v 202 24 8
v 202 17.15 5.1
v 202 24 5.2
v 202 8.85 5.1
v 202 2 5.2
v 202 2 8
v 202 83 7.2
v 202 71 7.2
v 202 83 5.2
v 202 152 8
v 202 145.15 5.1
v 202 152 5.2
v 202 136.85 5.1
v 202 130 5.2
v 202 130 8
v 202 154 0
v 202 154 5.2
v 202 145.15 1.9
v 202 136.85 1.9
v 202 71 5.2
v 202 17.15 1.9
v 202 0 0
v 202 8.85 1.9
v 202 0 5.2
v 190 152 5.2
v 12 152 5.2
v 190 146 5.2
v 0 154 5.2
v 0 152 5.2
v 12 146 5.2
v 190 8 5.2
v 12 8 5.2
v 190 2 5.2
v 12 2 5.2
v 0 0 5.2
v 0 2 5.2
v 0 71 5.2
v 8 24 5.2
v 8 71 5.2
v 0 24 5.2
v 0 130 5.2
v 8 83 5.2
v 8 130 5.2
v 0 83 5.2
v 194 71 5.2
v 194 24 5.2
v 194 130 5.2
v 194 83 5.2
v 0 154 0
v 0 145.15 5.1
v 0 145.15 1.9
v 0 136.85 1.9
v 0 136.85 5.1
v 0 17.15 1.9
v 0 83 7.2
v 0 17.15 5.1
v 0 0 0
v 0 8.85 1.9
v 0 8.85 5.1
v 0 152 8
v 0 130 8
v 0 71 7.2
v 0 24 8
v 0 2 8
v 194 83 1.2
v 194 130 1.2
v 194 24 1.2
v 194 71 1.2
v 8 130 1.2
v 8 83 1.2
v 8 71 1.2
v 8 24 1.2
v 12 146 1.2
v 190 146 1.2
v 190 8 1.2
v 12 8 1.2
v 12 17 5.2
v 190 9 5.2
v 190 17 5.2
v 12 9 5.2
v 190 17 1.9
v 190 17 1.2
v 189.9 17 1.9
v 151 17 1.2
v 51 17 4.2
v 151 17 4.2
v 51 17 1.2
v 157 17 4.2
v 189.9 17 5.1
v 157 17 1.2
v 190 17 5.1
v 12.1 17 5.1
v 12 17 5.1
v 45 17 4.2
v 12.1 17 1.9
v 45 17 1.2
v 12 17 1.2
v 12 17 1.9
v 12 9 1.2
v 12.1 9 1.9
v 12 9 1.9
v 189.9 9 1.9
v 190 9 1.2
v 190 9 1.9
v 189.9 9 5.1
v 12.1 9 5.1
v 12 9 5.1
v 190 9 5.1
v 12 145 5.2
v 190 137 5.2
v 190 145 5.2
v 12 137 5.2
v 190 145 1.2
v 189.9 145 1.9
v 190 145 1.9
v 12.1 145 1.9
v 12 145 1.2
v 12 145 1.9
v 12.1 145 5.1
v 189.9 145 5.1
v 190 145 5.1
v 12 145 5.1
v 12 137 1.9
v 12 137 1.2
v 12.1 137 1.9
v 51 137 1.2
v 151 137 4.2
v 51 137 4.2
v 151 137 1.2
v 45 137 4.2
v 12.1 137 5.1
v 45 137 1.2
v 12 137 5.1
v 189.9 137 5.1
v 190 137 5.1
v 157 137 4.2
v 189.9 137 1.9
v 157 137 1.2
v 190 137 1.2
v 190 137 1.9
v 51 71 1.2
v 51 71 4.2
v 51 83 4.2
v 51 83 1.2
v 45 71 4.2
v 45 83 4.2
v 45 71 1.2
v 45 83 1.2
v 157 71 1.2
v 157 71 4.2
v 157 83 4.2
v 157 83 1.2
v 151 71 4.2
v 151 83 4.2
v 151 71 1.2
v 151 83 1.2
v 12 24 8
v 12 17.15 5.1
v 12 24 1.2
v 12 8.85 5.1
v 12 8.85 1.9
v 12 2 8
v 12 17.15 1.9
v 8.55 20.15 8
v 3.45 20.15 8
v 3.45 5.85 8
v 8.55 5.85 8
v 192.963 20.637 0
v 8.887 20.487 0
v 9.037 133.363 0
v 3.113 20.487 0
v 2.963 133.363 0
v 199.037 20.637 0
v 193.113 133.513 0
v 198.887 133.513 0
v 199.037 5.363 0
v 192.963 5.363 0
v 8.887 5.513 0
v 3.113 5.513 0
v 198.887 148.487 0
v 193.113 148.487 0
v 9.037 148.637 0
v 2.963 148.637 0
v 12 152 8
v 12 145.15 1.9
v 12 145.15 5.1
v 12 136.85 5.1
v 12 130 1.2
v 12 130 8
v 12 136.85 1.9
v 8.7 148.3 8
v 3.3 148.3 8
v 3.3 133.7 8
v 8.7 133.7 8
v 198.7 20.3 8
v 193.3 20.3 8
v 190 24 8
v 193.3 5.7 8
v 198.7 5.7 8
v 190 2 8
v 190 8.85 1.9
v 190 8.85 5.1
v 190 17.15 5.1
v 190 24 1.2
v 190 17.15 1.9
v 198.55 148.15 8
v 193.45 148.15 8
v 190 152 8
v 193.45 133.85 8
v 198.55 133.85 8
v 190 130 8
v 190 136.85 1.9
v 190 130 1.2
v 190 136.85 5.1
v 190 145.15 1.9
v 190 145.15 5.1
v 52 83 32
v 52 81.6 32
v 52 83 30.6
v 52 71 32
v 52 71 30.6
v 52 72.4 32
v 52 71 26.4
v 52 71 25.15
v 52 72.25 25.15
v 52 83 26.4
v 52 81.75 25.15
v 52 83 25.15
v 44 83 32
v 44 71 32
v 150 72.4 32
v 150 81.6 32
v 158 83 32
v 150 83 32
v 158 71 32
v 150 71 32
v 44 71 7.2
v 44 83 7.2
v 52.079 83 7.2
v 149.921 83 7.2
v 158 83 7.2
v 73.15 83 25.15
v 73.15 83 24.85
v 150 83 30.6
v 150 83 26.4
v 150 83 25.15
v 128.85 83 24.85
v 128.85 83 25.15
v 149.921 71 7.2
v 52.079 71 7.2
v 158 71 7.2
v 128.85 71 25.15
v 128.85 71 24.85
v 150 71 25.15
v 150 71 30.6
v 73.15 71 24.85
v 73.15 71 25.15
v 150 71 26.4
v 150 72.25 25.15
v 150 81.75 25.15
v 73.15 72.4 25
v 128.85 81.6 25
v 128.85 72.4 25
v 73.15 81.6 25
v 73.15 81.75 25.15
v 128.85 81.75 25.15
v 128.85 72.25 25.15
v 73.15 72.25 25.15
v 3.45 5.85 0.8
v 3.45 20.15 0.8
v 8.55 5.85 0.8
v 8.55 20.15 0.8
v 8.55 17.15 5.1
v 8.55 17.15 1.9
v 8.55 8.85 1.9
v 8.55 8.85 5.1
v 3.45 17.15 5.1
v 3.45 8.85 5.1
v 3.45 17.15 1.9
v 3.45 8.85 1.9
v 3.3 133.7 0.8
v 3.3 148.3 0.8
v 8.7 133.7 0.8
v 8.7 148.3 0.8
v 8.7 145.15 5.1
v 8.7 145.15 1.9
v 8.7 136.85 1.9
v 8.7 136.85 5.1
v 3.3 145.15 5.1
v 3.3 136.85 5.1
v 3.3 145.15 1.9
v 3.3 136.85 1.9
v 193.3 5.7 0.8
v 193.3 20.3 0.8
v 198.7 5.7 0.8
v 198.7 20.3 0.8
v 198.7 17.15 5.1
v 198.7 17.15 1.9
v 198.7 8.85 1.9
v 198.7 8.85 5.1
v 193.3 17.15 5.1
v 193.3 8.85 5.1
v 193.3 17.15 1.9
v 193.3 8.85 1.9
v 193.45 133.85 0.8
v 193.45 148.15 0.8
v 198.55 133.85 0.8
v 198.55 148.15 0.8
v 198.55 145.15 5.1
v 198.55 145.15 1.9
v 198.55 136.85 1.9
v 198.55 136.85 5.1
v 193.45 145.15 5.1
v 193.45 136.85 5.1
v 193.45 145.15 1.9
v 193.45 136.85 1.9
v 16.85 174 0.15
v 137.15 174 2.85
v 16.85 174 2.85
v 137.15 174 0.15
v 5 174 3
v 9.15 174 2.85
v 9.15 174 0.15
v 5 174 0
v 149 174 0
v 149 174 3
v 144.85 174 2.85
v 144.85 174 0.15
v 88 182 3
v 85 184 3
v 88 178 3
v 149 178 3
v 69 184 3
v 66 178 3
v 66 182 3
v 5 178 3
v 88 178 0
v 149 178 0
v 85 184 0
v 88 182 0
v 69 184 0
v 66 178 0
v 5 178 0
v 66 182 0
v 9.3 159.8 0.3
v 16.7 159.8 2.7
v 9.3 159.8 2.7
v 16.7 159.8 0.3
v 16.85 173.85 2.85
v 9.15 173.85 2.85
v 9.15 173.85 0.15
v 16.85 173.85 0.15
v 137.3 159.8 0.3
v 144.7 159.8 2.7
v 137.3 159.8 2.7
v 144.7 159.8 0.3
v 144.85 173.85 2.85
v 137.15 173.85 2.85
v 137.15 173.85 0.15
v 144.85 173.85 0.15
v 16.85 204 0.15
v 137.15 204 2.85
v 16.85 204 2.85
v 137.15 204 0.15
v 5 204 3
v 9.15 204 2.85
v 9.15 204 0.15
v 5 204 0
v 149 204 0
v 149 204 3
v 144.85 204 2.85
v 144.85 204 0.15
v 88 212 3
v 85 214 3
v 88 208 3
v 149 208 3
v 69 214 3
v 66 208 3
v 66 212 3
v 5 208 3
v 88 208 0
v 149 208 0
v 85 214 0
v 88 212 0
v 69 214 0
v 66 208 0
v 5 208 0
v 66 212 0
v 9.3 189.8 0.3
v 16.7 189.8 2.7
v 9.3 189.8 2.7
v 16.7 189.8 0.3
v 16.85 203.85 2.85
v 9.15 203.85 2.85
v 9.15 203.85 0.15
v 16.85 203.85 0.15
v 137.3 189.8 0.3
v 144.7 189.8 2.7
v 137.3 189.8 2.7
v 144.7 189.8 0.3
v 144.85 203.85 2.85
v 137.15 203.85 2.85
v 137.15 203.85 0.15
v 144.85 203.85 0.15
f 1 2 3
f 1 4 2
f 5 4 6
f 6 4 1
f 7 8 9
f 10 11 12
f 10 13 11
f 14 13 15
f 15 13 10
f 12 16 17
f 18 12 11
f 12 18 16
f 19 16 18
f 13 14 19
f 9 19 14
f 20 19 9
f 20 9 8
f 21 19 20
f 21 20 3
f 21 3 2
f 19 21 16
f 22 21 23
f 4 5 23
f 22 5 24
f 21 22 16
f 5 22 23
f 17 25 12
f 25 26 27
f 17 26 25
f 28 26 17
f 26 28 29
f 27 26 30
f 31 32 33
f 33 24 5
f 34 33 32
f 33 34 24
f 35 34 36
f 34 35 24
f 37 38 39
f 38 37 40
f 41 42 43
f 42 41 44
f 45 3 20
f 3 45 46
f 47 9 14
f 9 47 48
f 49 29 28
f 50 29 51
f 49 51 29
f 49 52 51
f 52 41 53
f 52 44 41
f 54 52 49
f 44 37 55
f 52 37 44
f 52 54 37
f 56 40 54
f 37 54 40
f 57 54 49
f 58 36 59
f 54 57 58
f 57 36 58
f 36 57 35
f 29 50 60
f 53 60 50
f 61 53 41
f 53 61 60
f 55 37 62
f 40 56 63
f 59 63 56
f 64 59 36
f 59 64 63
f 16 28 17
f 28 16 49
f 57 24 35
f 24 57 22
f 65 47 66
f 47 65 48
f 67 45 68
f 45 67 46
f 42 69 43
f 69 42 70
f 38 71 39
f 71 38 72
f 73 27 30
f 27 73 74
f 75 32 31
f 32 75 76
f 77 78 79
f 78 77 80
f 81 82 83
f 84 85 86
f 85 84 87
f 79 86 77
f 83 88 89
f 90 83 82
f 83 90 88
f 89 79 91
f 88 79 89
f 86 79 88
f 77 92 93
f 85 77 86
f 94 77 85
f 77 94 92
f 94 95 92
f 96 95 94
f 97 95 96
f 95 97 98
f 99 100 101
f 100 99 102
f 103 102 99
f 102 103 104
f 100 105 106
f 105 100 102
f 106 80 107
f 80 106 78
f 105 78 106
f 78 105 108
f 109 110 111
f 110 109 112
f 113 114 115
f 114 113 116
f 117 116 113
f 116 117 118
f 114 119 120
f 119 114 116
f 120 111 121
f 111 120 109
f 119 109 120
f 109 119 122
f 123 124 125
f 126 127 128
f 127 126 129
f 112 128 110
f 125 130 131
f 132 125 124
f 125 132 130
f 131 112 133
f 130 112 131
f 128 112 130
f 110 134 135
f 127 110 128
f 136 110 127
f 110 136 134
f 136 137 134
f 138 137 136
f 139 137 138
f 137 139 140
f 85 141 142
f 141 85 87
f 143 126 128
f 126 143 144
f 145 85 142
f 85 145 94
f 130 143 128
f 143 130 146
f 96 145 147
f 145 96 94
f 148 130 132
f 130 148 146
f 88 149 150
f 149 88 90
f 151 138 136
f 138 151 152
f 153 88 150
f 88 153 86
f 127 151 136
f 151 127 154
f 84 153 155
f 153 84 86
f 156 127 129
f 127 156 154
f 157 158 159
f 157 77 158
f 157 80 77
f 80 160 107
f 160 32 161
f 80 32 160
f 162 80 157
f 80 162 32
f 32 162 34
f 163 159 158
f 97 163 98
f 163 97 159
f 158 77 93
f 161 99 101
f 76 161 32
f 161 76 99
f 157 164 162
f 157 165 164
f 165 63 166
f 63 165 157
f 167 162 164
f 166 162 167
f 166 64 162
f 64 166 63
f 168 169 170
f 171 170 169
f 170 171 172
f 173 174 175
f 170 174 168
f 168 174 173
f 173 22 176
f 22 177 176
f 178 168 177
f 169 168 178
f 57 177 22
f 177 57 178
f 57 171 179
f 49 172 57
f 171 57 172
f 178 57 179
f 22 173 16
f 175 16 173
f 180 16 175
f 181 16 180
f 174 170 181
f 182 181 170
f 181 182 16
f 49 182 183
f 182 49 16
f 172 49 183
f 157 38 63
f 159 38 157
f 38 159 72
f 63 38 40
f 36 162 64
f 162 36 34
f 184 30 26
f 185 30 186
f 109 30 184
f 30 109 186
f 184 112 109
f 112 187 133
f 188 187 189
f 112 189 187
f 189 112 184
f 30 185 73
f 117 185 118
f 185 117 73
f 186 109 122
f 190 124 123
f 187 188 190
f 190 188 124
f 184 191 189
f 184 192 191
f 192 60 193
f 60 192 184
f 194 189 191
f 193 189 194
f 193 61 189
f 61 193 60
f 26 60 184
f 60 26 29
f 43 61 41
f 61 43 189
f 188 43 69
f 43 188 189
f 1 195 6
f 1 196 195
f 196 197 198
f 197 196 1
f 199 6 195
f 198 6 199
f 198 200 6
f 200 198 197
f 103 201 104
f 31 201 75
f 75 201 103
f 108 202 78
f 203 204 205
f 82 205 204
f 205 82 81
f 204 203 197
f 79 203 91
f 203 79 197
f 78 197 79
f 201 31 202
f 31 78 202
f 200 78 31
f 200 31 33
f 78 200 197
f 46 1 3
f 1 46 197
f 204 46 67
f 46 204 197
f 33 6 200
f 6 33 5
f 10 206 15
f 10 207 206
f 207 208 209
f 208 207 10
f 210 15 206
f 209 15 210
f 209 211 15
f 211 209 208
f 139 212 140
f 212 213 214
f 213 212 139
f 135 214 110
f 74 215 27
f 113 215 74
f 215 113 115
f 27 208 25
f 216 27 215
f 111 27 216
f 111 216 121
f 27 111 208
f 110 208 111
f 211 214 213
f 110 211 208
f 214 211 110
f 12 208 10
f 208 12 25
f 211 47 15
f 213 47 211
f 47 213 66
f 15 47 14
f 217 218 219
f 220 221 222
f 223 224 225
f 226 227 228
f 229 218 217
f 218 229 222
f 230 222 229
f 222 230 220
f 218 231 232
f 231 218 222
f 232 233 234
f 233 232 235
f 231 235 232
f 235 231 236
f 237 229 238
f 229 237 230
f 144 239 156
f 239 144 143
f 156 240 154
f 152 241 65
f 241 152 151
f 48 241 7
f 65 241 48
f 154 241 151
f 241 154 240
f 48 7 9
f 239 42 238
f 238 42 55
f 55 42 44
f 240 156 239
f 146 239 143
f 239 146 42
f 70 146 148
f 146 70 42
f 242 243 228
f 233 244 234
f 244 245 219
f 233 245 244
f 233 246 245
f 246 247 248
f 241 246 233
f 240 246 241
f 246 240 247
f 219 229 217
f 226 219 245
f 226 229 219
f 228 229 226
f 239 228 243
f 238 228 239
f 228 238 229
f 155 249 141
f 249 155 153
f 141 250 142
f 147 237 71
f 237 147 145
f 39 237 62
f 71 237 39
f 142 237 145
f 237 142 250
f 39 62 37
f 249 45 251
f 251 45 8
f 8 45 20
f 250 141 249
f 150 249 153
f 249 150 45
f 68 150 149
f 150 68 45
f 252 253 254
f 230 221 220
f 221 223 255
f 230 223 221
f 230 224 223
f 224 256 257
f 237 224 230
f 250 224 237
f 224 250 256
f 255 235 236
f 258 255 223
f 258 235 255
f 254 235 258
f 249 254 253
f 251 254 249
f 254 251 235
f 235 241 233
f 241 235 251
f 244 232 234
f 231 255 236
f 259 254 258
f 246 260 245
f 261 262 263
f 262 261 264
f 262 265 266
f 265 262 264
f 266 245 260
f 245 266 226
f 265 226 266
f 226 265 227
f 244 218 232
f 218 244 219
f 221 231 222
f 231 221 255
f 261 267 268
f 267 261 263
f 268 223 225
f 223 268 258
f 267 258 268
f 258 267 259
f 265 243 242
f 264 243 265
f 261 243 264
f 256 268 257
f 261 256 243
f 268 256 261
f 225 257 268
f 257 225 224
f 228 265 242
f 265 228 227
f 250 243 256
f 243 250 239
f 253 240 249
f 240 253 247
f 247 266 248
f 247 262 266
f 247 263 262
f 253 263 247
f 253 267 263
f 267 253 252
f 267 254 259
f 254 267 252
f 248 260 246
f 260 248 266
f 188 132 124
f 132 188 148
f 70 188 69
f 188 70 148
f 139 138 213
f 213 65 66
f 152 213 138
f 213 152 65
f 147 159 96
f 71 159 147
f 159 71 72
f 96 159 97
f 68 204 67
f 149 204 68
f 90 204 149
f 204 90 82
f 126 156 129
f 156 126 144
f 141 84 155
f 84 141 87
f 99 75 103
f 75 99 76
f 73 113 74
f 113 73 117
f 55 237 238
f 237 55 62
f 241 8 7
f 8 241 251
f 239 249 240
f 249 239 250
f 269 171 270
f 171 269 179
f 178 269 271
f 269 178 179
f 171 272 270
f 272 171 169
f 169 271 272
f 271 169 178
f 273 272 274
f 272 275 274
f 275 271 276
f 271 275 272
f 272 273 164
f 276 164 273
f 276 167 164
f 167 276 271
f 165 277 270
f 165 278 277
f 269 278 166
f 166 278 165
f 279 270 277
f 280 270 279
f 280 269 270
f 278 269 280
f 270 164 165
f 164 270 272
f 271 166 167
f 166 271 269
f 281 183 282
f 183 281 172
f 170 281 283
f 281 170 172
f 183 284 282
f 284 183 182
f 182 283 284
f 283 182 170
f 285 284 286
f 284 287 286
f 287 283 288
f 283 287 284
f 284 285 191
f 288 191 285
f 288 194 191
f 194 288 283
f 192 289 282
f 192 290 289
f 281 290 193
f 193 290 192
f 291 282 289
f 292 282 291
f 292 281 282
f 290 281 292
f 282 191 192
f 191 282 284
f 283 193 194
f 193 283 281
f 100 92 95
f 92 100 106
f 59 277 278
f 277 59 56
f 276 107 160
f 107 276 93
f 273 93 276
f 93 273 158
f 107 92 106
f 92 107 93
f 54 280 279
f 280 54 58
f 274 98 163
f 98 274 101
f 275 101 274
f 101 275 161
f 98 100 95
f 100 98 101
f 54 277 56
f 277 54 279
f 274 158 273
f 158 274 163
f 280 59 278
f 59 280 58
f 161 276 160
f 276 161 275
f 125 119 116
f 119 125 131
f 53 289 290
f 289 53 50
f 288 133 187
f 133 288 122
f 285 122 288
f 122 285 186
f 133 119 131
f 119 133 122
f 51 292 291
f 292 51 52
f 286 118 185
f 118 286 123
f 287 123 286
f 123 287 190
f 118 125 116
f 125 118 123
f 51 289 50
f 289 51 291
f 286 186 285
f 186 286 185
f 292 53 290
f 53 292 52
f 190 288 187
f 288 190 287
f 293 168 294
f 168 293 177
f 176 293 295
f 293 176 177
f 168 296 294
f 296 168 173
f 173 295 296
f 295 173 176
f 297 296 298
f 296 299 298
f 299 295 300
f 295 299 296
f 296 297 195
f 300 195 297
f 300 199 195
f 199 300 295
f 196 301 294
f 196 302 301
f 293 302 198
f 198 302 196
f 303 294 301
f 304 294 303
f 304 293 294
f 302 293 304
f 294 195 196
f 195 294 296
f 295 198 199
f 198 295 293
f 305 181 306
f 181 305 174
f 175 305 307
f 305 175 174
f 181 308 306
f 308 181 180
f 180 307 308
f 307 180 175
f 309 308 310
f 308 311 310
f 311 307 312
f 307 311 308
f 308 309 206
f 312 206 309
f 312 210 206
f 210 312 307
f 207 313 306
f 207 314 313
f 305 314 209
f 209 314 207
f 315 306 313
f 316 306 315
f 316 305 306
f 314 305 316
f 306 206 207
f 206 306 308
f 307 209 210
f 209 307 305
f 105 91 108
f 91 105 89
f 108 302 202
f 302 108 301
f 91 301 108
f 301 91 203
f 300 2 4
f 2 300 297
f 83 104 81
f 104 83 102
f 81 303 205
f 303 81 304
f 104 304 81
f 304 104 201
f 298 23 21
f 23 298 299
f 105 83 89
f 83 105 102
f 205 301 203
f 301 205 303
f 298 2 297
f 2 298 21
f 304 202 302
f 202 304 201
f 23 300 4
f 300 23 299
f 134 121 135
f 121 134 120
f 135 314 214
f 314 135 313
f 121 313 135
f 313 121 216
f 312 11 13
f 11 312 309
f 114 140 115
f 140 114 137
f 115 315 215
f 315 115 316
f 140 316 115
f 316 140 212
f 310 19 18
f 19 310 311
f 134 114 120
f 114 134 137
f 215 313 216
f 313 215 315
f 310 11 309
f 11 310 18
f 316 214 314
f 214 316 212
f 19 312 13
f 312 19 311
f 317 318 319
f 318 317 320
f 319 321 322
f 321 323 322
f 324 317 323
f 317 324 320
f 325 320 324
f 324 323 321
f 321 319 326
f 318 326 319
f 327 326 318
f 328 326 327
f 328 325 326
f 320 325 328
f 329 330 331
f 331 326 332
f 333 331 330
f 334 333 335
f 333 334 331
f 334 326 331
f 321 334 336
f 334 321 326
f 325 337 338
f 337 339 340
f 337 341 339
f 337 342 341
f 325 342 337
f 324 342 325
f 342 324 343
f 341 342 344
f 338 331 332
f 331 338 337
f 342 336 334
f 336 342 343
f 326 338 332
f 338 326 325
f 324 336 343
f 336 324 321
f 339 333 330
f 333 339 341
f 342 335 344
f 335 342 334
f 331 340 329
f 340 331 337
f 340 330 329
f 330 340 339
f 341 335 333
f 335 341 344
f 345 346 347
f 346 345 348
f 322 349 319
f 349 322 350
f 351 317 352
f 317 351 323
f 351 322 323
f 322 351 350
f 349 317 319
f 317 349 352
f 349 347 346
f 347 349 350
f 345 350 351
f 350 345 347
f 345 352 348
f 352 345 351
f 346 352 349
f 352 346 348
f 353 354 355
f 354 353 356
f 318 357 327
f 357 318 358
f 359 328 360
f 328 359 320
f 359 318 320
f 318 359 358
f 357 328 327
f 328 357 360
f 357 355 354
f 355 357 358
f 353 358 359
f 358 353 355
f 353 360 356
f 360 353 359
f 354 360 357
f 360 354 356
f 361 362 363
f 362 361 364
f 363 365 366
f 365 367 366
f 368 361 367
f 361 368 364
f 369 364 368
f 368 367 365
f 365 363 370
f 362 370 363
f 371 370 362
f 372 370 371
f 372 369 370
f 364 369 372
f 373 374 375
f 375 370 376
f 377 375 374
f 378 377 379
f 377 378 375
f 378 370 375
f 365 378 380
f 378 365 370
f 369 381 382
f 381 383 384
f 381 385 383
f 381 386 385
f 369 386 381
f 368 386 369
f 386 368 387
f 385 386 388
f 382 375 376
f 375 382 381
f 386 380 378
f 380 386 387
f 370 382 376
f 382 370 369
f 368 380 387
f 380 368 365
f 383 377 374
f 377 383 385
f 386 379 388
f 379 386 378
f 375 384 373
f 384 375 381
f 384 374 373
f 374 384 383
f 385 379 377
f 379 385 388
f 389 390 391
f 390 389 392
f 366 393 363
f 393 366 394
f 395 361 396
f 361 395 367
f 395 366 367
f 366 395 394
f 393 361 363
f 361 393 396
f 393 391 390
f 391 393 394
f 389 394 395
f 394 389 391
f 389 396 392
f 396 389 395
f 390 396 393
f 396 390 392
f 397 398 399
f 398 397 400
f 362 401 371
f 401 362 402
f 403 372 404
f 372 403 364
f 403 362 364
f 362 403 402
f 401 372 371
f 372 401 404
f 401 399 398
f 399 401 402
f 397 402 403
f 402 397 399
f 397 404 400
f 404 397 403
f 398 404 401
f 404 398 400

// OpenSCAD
// Mealworm rack top cover with handle v1.1 — units: mm.
// Compatible with rack_flatpack_center_guide_r3_5.scad.
// Target: PETG, 0.4 mm nozzle, 0.20–0.24 mm layer height.
//
// Frozen interfaces reused without modifying the rack:
// - R3.5 rack envelope: 198 x 150 mm.
// - Four top tongues: 4.8 x 14.0 x 7.0 mm.
// - Tongue lock passages: 8.0 x 3.0 mm, center height 3.5 mm.
//
// Locating and retention features (loaded carrying is untested):
// - Four vertical sockets locate the cover.
// - Two diagonal sockets use 0.15 mm per-side clearance for light friction.
// - Two sockets use 0.30 mm per-side relief to prevent four-point binding.
// - Two identical removable side-lock rails positively engage all four tongue
//   passages. Carrying load does not rely on socket friction.
// - The continuous 1.2 mm skin closes the top drawer; raised ribs reinforce it.
//
// Export with part="cover" | "side_lock" | "print_plate" |
//                  "assembly_preview" | "fit_check".

use <rack_flatpack_center_guide_r3_5.scad>

$fn = 36;
part = "print_plate";

// Cover placement is shifted +10 X / +2 Y from the R3.5 rack coordinates.
cover_w = 202;
cover_d = 154;
base_t = 1.20;

// Existing rack top-tongue centers in the shifted cover coordinate system.
socket_x = [6,196];
socket_y = [13,141];
tongue_x = 4.80;
tongue_y = 14.00;
tongue_h = 7.00;

// Socket/collar structure.
collar_x = 12.0;
collar_y = 22.0;
collar_h = 8.0;
locator_clearance = 0.15;  // Per side, on two diagonal sockets.
relief_clearance = 0.30;   // Per side, on the other two sockets.
lead_in = 0.35;

// Positive side-lock interface.
lock_passage_y = 8.30;
lock_passage_z = 3.20;
lock_center_z = 3.50;
lock_pin_y = 7.70;
lock_pin_z = 2.70;
lock_pin_len = 14.20;
lock_tip_reduction = 0.30;

// Lightweight structural grid, revised for PETG HF.
perimeter_w = 8.0;
perimeter_total_h = 5.2;
joint_beam_w = 8.0;
joint_beam_total_h = 5.2;
center_beam_w = 12.0;
center_beam_total_h = 7.2;
long_rib_w = 6.0;
long_rib_total_h = 4.2;
long_rib_x = [48,154];

// Slim single-pocket PETG-HF handle with two end supports.
handle_x0 = 44;
handle_x1 = 158;
handle_y0 = 71;
handle_y1 = 83;
handle_bar_z0 = 25;
handle_bar_z1 = 32;
support_w = 8;
support_x = [44,150];
gusset_run = 21;
gusset_z0 = center_beam_total_h;

module perimeter_rib() {
    translate([0,0,base_t-0.01])
        difference() {
            cube([cover_w,cover_d,perimeter_total_h-base_t+0.01]);
            translate([perimeter_w,perimeter_w,-0.02])
                cube([cover_w-2*perimeter_w,
                      cover_d-2*perimeter_w,
                      perimeter_total_h-base_t+0.05]);
        }
}

module beam_x(yc,w,total_h) {
    translate([0,yc-w/2,base_t-0.01])
        cube([cover_w,w,total_h-base_t+0.01]);
}

module rib_y(xc,w,y0,y1,total_h) {
    translate([xc-w/2,y0,base_t-0.01])
        cube([w,y1-y0,total_h-base_t+0.01]);
}

module collar(cx,cy) {
    translate([cx-collar_x/2,cy-collar_y/2,0])
        cube([collar_x,collar_y,collar_h]);
}

module socket_cut(cx,cy,c) {
    sx = tongue_x+2*c;
    sy = tongue_y+2*c;

    // A wider bottom mouth removes first-layer and angular insertion risk.
    hull() {
        translate([cx-(sx+2*lead_in)/2,
                   cy-(sy+2*lead_in)/2,-0.05])
            cube([sx+2*lead_in,sy+2*lead_in,0.02]);
        translate([cx-sx/2,cy-sy/2,0.78])
            cube([sx,sy,0.02]);
    }
    translate([cx-sx/2,cy-sy/2,0.78])
        cube([sx,sy,collar_h-0.73]);
}

module collar_lock_passage(cx,cy) {
    translate([cx-collar_x/2-0.10,
               cy-lock_passage_y/2,
               lock_center_z-lock_passage_z/2])
        cube([collar_x+0.20,lock_passage_y,lock_passage_z]);
}

module grip_bar() {
    // Chamfered 114 x 12 x 7 mm grip; lighter while retaining a comfortable span.
    x0=handle_x0;
    x1=handle_x1;
    y0=handle_y0;
    y1=handle_y1;
    z0=handle_bar_z0;
    z1=handle_bar_z1;
    c=1.4;

    polyhedron(
        points=[
            [x0,y0+c,z0], [x0,y1-c,z0],
            [x0,y1,z0+c], [x0,y1,z1-c],
            [x0,y1-c,z1], [x0,y0+c,z1],
            [x0,y0,z1-c], [x0,y0,z0+c],

            [x1,y0+c,z0], [x1,y1-c,z0],
            [x1,y1,z0+c], [x1,y1,z1-c],
            [x1,y1-c,z1], [x1,y0+c,z1],
            [x1,y0,z1-c], [x1,y0,z0+c]
        ],
        faces=[
            [7,6,5,4,3,2,1,0],
            [8,9,10,11,12,13,14,15],
            [0,1,9,8], [1,2,10,9], [2,3,11,10],
            [3,4,12,11], [4,5,13,12], [5,6,14,13],
            [6,7,15,14], [7,0,8,15]
        ], convexity=6
    );
}

module handle_support(x0) {
    translate([x0,handle_y0,base_t-0.01])
        cube([support_w,handle_y1-handle_y0,
              handle_bar_z1-base_t+0.01]);
}

module gusset_from_edge(xe,dir) {
    // Printable inward shoulder; the two shoulders reduce the central bridge to about 56 mm.
    // The first two hull nodes overlap the support by 0.25 mm, avoiding a
    // coincident-edge-only union that some slicers report as non-manifold.
    xs=xe-dir*0.25;
    xt=xe+dir*gusset_run;
    node=0.30;

    hull() {
        translate([xs-node/2,handle_y0,gusset_z0-node/2])
            cube([node,handle_y1-handle_y0,node]);
        translate([xs-node/2,handle_y0,handle_bar_z0-node/2])
            cube([node,handle_y1-handle_y0,node]);
        translate([xt-node/2,handle_y0,handle_bar_z0-node/2])
            cube([node,handle_y1-handle_y0,node]);
    }
}

module carry_handle() {
    union() {
        grip_bar();
        for (x0=support_x) handle_support(x0);

        // One inward shoulder from each end support; no center post.
        gusset_from_edge(support_x[0]+support_w, 1);
        gusset_from_edge(support_x[1],-1);
    }
}

module cover_positive() {
    union() {
        cube([cover_w,cover_d,base_t]);
        perimeter_rib();

        // Front/rear load beams align with the four rack tongues.
        for (yc=socket_y)
            beam_x(yc,joint_beam_w,joint_beam_total_h);

        // Central handle beam transfers lift to both side beams.
        beam_x((handle_y0+handle_y1)/2,
               center_beam_w,center_beam_total_h);

        // Longitudinal ribs connect the handle end supports to both joint rows.
        for (xc=long_rib_x)
            rib_y(xc,long_rib_w,socket_y[0],socket_y[1],long_rib_total_h);

        for (cx=socket_x)
            for (cy=socket_y)
                collar(cx,cy);

        carry_handle();
    }
}

module top_cover() {
    difference() {
        cover_positive();

        // Tight sockets are diagonal; relieved sockets absorb rack/print skew.
        for (ix=[0:1])
            for (iy=[0:1]) {
                c=(ix==iy) ? locator_clearance : relief_clearance;
                socket_cut(socket_x[ix],socket_y[iy],c);
                collar_lock_passage(socket_x[ix],socket_y[iy]);
            }
    }
}

module positive_lock_pin(yc) {
    // The root overlaps the strap by 0.2 mm; the insertion tip is tapered.
    root_x=9.80;
    tip_x=10+lock_pin_len;
    hull() {
        translate([root_x,yc-lock_pin_y/2,(3-lock_pin_z)/2])
            cube([0.35,lock_pin_y,lock_pin_z]);
        translate([tip_x-0.35,
                   yc-(lock_pin_y-lock_tip_reduction)/2,
                   (3-(lock_pin_z-lock_tip_reduction))/2])
            cube([0.35,
                  lock_pin_y-lock_tip_reduction,
                  lock_pin_z-lock_tip_reduction]);
    }
}

module side_lock() {
    union() {
        // 144 mm strap. In assembly it sits outside one rack side.
        translate([6,5,0]) cube([4,144,3]);

        // Center pull tab remains outside the cover edge.
        hull() {
            translate([0,69,0]) cube([10,16,3]);
            translate([2,66,0]) cube([8,22,3]);
        }

        positive_lock_pin(socket_y[0]);
        positive_lock_pin(socket_y[1]);
    }
}

module left_lock_assembled(z0=58) {
    translate([-10,0,z0+2]) side_lock();
}

module right_lock_assembled(z0=58) {
    translate([212,154,z0+2])
        rotate([0,0,180]) side_lock();
}

module rack_reference() {
    // R3.5 native bounds are X=-8..190, Y=0..150.
    translate([10,2,0]) assembled_tier(0);
}

module assembly_preview() {
    color([0.34,0.38,0.41]) rack_reference();
    color([0.73,0.40,0.13]) translate([0,0,58]) top_cover();
    color([0.82,0.20,0.14]) {
        left_lock_assembled(58);
        right_lock_assembled(58);
    }
}

module print_plate() {
    top_cover();

    // Two identical locks fit on the same 256 x 256 mm plate.
    translate([0,184,0]) rotate([0,0,-90]) side_lock();
    translate([0,214,0]) rotate([0,0,-90]) side_lock();
}

module fit_check() {
    // A valid result is empty or only zero-thickness contact surfaces.
    intersection() {
        color([0.34,0.38,0.41]) rack_reference();
        union() {
            translate([0,0,58]) top_cover();
            left_lock_assembled(58);
            right_lock_assembled(58);
        }
    }
}

if (part=="cover") top_cover();
else if (part=="side_lock") side_lock();
else if (part=="print_plate") print_plate();
else if (part=="assembly_preview") assembly_preview();
else if (part=="fit_check") fit_check();
else assert(false,"Unknown part");
